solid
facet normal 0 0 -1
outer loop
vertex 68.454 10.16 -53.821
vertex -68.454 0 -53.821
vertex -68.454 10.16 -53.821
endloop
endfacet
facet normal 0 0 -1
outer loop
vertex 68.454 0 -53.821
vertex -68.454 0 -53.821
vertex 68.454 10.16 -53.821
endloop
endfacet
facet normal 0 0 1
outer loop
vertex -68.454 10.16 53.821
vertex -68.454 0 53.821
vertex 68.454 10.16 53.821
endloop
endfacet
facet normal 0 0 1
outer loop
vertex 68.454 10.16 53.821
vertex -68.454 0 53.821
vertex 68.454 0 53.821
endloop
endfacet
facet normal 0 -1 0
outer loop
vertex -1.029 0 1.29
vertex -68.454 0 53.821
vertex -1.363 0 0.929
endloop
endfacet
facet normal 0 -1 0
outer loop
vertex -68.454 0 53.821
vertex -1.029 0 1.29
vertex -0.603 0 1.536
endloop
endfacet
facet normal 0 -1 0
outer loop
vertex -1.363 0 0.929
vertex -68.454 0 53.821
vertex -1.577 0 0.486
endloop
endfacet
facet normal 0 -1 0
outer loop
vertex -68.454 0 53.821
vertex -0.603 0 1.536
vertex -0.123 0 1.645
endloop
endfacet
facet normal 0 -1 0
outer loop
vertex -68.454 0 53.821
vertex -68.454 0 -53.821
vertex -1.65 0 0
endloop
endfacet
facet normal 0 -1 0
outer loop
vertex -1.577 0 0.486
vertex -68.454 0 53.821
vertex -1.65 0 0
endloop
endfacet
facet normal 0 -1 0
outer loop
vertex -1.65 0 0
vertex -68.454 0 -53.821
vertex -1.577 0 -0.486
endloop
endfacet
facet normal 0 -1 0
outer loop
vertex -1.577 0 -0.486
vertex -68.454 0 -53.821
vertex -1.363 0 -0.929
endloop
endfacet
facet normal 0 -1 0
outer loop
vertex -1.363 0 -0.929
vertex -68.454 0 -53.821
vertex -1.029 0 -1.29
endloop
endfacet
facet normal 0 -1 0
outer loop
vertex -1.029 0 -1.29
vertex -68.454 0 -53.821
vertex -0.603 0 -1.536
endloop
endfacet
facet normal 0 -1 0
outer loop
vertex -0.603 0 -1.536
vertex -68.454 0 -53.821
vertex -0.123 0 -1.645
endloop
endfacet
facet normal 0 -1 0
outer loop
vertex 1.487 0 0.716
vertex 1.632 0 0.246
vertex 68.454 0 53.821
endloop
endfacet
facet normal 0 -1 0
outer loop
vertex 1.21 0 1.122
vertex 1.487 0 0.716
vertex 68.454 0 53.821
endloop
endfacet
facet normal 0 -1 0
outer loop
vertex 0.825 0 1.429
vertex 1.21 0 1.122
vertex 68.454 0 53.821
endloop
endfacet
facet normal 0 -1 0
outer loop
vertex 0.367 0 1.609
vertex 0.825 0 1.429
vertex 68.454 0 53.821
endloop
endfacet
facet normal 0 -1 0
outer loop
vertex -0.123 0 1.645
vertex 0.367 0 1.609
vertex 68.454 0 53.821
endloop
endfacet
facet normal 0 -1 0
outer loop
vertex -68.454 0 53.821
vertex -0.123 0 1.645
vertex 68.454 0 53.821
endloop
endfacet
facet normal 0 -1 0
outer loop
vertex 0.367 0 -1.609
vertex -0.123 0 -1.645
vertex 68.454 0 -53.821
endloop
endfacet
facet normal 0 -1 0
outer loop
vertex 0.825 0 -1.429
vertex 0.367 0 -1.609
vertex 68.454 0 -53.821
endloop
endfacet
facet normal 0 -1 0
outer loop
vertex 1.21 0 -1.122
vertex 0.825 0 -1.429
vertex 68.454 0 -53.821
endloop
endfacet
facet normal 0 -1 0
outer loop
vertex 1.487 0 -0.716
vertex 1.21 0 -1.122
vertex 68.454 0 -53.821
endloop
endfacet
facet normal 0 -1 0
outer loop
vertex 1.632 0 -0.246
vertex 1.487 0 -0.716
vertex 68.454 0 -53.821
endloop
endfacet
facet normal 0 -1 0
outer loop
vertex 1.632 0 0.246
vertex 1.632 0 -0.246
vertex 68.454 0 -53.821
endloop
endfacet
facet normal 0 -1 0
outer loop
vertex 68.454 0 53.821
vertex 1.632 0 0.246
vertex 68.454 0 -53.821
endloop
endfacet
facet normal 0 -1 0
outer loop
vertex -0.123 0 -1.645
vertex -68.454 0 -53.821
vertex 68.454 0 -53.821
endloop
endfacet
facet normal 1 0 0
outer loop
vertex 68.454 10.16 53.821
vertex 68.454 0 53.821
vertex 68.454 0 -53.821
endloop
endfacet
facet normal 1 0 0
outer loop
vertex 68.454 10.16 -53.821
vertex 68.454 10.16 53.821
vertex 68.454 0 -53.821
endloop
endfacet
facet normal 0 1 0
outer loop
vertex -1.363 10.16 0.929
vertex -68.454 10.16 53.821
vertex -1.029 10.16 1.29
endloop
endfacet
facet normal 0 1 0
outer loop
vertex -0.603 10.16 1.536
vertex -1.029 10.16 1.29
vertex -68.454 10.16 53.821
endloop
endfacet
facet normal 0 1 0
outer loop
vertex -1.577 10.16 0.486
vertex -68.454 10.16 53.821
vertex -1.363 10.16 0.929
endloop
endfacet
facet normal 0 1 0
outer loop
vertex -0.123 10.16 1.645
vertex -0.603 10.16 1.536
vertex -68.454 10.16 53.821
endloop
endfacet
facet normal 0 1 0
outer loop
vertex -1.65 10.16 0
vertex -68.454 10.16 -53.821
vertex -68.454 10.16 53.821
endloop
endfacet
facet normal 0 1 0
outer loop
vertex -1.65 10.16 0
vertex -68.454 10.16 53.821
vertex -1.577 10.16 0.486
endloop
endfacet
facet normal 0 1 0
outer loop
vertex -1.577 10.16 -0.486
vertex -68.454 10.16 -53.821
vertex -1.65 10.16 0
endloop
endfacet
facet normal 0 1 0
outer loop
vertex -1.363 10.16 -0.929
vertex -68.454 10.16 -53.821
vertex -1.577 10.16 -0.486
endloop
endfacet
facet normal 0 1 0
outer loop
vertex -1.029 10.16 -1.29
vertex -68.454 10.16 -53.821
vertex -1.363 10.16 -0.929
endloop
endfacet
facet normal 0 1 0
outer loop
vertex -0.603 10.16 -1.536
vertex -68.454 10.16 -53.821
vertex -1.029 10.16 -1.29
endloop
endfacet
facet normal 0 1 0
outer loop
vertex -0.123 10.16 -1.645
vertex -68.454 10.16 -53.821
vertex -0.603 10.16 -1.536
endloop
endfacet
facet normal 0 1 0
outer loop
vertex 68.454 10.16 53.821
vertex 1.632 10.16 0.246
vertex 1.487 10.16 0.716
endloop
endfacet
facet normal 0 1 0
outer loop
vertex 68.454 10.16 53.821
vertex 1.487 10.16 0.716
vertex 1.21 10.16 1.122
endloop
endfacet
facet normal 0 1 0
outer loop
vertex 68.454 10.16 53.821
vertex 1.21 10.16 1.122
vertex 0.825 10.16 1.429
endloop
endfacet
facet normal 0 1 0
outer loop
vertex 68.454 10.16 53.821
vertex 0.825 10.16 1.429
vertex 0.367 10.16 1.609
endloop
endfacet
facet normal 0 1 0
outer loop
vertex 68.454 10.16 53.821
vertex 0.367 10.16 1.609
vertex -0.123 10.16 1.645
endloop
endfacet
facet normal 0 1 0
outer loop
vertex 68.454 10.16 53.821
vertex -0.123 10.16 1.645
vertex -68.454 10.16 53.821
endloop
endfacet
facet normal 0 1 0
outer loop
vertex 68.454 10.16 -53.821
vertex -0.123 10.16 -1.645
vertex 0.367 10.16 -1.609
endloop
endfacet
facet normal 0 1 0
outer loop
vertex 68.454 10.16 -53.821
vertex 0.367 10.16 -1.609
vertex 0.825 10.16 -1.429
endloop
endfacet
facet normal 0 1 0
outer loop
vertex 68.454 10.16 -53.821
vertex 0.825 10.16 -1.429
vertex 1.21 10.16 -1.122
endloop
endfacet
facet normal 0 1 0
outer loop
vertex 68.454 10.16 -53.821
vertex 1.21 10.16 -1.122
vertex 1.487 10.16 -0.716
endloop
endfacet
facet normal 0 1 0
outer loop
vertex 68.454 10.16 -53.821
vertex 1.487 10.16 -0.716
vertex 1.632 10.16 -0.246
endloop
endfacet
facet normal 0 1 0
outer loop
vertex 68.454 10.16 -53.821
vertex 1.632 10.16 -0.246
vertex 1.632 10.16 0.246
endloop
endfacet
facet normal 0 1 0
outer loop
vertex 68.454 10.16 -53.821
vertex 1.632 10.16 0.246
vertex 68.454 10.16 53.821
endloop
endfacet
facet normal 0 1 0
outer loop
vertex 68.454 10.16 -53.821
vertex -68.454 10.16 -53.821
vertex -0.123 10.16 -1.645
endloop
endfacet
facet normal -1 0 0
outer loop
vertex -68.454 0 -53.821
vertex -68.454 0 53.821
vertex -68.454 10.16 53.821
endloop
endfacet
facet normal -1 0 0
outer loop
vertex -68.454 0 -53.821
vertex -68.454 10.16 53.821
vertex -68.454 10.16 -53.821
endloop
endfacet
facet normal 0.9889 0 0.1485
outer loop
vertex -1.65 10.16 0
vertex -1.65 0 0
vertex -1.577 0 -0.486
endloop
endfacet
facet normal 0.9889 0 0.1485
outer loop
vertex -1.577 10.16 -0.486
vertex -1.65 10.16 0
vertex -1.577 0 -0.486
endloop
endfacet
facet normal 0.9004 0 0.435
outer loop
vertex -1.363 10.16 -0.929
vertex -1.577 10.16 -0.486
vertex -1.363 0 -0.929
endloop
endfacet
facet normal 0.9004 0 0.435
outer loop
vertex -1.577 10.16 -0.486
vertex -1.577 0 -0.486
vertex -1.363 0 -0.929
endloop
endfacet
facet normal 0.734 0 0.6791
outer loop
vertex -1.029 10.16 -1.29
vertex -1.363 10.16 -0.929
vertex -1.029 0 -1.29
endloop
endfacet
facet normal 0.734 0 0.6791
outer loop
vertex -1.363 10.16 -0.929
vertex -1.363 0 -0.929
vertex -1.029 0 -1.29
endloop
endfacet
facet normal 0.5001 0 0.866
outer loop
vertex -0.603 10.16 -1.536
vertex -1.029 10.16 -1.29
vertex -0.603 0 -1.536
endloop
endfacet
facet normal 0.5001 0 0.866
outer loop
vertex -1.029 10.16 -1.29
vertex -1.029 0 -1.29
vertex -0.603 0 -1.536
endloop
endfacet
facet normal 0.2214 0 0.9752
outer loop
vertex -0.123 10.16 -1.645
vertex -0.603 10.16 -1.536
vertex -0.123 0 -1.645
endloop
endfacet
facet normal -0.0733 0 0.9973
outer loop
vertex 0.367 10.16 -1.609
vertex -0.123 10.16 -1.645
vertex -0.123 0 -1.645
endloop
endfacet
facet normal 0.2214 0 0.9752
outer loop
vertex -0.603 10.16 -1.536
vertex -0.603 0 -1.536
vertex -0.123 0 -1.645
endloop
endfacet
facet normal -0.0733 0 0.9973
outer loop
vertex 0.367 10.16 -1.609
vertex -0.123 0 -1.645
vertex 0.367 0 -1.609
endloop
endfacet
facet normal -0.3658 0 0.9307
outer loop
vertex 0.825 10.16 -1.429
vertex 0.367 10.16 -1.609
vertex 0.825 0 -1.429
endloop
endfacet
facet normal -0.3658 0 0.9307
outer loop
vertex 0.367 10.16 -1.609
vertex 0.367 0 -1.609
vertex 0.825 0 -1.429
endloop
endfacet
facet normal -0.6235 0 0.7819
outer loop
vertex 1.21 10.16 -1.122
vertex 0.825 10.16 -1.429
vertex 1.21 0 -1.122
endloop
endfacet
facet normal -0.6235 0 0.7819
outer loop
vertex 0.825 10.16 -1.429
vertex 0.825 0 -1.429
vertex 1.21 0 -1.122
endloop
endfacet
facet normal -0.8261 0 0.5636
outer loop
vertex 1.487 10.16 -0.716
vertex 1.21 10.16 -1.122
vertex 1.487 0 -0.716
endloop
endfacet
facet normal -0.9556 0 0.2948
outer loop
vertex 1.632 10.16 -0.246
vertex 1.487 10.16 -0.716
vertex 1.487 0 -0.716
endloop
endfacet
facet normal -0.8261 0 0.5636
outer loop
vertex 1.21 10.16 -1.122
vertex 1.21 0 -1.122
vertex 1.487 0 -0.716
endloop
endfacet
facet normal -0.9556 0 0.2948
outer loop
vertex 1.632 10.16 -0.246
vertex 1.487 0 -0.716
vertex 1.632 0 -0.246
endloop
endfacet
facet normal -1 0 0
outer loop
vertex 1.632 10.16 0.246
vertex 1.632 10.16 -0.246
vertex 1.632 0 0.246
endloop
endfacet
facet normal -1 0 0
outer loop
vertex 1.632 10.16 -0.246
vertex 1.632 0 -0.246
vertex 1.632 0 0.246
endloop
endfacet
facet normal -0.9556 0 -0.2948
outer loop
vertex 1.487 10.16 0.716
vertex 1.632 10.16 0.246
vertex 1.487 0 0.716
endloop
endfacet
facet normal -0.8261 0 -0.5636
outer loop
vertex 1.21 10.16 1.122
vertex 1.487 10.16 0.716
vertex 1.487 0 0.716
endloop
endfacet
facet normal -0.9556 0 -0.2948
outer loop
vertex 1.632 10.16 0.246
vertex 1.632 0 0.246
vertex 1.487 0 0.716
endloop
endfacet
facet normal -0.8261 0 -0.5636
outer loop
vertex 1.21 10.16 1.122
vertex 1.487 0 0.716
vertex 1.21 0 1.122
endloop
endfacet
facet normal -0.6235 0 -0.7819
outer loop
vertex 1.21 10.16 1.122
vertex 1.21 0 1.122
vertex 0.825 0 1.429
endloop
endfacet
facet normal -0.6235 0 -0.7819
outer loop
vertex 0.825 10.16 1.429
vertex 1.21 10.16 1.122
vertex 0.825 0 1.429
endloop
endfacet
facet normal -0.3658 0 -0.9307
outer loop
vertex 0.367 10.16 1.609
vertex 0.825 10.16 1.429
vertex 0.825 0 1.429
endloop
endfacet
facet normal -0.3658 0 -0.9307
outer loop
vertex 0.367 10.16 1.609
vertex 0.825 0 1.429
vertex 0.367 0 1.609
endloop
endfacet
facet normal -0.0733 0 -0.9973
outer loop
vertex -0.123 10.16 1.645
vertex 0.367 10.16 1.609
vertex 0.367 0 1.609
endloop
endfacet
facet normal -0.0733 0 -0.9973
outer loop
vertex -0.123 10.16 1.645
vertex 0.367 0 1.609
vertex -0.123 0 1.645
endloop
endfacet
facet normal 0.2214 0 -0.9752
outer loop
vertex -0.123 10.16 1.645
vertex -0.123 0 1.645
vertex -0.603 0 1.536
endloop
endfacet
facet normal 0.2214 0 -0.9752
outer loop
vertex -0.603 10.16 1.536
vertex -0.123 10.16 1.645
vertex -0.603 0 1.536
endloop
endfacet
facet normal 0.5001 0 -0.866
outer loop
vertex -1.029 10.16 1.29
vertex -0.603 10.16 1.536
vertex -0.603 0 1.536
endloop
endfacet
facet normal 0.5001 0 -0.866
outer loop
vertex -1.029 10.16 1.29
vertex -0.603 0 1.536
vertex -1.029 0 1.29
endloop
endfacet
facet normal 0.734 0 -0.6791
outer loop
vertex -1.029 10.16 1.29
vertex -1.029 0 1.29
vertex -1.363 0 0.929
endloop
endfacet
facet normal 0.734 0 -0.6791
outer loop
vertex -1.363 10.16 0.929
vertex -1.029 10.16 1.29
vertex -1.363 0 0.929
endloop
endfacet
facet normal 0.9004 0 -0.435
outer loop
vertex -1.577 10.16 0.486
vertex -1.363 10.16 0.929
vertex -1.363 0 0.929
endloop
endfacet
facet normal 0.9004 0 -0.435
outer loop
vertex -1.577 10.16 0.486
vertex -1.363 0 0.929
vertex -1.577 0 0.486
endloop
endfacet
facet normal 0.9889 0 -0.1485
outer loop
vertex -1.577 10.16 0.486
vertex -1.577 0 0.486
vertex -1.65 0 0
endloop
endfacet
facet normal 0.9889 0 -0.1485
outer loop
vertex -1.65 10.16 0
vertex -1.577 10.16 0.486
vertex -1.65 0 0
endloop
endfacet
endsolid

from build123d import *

# Parameters (mm, degrees)
SKETCH1_W                   = 136.90876716
SKETCH1_H                   = 107.642037948
BOSS_EXTRUDE1_DEPTH         = 10.16
TAP_DRILL_FOR_M4X0_7_TAP1_D = 3.3


with BuildPart() as part:
    # Sketch1 → Boss-Extrude1 (new body)
    with BuildSketch(Plane(origin=(0, 0, 0), x_dir=(1, 0, 0), z_dir=(0, 1, 0))):
        Rectangle(SKETCH1_W, SKETCH1_H)
    extrude(amount=BOSS_EXTRUDE1_DEPTH)

    # Tap Drill for M4x0.7 Tap1 (through all)
    with Locations(Plane(origin=(0, 10.16, 0), x_dir=(1, 0, 0), z_dir=(0, 1, 0))):
        with Locations((0, 0)):
            Hole(TAP_DRILL_FOR_M4X0_7_TAP1_D / 2)


solid = part.part
